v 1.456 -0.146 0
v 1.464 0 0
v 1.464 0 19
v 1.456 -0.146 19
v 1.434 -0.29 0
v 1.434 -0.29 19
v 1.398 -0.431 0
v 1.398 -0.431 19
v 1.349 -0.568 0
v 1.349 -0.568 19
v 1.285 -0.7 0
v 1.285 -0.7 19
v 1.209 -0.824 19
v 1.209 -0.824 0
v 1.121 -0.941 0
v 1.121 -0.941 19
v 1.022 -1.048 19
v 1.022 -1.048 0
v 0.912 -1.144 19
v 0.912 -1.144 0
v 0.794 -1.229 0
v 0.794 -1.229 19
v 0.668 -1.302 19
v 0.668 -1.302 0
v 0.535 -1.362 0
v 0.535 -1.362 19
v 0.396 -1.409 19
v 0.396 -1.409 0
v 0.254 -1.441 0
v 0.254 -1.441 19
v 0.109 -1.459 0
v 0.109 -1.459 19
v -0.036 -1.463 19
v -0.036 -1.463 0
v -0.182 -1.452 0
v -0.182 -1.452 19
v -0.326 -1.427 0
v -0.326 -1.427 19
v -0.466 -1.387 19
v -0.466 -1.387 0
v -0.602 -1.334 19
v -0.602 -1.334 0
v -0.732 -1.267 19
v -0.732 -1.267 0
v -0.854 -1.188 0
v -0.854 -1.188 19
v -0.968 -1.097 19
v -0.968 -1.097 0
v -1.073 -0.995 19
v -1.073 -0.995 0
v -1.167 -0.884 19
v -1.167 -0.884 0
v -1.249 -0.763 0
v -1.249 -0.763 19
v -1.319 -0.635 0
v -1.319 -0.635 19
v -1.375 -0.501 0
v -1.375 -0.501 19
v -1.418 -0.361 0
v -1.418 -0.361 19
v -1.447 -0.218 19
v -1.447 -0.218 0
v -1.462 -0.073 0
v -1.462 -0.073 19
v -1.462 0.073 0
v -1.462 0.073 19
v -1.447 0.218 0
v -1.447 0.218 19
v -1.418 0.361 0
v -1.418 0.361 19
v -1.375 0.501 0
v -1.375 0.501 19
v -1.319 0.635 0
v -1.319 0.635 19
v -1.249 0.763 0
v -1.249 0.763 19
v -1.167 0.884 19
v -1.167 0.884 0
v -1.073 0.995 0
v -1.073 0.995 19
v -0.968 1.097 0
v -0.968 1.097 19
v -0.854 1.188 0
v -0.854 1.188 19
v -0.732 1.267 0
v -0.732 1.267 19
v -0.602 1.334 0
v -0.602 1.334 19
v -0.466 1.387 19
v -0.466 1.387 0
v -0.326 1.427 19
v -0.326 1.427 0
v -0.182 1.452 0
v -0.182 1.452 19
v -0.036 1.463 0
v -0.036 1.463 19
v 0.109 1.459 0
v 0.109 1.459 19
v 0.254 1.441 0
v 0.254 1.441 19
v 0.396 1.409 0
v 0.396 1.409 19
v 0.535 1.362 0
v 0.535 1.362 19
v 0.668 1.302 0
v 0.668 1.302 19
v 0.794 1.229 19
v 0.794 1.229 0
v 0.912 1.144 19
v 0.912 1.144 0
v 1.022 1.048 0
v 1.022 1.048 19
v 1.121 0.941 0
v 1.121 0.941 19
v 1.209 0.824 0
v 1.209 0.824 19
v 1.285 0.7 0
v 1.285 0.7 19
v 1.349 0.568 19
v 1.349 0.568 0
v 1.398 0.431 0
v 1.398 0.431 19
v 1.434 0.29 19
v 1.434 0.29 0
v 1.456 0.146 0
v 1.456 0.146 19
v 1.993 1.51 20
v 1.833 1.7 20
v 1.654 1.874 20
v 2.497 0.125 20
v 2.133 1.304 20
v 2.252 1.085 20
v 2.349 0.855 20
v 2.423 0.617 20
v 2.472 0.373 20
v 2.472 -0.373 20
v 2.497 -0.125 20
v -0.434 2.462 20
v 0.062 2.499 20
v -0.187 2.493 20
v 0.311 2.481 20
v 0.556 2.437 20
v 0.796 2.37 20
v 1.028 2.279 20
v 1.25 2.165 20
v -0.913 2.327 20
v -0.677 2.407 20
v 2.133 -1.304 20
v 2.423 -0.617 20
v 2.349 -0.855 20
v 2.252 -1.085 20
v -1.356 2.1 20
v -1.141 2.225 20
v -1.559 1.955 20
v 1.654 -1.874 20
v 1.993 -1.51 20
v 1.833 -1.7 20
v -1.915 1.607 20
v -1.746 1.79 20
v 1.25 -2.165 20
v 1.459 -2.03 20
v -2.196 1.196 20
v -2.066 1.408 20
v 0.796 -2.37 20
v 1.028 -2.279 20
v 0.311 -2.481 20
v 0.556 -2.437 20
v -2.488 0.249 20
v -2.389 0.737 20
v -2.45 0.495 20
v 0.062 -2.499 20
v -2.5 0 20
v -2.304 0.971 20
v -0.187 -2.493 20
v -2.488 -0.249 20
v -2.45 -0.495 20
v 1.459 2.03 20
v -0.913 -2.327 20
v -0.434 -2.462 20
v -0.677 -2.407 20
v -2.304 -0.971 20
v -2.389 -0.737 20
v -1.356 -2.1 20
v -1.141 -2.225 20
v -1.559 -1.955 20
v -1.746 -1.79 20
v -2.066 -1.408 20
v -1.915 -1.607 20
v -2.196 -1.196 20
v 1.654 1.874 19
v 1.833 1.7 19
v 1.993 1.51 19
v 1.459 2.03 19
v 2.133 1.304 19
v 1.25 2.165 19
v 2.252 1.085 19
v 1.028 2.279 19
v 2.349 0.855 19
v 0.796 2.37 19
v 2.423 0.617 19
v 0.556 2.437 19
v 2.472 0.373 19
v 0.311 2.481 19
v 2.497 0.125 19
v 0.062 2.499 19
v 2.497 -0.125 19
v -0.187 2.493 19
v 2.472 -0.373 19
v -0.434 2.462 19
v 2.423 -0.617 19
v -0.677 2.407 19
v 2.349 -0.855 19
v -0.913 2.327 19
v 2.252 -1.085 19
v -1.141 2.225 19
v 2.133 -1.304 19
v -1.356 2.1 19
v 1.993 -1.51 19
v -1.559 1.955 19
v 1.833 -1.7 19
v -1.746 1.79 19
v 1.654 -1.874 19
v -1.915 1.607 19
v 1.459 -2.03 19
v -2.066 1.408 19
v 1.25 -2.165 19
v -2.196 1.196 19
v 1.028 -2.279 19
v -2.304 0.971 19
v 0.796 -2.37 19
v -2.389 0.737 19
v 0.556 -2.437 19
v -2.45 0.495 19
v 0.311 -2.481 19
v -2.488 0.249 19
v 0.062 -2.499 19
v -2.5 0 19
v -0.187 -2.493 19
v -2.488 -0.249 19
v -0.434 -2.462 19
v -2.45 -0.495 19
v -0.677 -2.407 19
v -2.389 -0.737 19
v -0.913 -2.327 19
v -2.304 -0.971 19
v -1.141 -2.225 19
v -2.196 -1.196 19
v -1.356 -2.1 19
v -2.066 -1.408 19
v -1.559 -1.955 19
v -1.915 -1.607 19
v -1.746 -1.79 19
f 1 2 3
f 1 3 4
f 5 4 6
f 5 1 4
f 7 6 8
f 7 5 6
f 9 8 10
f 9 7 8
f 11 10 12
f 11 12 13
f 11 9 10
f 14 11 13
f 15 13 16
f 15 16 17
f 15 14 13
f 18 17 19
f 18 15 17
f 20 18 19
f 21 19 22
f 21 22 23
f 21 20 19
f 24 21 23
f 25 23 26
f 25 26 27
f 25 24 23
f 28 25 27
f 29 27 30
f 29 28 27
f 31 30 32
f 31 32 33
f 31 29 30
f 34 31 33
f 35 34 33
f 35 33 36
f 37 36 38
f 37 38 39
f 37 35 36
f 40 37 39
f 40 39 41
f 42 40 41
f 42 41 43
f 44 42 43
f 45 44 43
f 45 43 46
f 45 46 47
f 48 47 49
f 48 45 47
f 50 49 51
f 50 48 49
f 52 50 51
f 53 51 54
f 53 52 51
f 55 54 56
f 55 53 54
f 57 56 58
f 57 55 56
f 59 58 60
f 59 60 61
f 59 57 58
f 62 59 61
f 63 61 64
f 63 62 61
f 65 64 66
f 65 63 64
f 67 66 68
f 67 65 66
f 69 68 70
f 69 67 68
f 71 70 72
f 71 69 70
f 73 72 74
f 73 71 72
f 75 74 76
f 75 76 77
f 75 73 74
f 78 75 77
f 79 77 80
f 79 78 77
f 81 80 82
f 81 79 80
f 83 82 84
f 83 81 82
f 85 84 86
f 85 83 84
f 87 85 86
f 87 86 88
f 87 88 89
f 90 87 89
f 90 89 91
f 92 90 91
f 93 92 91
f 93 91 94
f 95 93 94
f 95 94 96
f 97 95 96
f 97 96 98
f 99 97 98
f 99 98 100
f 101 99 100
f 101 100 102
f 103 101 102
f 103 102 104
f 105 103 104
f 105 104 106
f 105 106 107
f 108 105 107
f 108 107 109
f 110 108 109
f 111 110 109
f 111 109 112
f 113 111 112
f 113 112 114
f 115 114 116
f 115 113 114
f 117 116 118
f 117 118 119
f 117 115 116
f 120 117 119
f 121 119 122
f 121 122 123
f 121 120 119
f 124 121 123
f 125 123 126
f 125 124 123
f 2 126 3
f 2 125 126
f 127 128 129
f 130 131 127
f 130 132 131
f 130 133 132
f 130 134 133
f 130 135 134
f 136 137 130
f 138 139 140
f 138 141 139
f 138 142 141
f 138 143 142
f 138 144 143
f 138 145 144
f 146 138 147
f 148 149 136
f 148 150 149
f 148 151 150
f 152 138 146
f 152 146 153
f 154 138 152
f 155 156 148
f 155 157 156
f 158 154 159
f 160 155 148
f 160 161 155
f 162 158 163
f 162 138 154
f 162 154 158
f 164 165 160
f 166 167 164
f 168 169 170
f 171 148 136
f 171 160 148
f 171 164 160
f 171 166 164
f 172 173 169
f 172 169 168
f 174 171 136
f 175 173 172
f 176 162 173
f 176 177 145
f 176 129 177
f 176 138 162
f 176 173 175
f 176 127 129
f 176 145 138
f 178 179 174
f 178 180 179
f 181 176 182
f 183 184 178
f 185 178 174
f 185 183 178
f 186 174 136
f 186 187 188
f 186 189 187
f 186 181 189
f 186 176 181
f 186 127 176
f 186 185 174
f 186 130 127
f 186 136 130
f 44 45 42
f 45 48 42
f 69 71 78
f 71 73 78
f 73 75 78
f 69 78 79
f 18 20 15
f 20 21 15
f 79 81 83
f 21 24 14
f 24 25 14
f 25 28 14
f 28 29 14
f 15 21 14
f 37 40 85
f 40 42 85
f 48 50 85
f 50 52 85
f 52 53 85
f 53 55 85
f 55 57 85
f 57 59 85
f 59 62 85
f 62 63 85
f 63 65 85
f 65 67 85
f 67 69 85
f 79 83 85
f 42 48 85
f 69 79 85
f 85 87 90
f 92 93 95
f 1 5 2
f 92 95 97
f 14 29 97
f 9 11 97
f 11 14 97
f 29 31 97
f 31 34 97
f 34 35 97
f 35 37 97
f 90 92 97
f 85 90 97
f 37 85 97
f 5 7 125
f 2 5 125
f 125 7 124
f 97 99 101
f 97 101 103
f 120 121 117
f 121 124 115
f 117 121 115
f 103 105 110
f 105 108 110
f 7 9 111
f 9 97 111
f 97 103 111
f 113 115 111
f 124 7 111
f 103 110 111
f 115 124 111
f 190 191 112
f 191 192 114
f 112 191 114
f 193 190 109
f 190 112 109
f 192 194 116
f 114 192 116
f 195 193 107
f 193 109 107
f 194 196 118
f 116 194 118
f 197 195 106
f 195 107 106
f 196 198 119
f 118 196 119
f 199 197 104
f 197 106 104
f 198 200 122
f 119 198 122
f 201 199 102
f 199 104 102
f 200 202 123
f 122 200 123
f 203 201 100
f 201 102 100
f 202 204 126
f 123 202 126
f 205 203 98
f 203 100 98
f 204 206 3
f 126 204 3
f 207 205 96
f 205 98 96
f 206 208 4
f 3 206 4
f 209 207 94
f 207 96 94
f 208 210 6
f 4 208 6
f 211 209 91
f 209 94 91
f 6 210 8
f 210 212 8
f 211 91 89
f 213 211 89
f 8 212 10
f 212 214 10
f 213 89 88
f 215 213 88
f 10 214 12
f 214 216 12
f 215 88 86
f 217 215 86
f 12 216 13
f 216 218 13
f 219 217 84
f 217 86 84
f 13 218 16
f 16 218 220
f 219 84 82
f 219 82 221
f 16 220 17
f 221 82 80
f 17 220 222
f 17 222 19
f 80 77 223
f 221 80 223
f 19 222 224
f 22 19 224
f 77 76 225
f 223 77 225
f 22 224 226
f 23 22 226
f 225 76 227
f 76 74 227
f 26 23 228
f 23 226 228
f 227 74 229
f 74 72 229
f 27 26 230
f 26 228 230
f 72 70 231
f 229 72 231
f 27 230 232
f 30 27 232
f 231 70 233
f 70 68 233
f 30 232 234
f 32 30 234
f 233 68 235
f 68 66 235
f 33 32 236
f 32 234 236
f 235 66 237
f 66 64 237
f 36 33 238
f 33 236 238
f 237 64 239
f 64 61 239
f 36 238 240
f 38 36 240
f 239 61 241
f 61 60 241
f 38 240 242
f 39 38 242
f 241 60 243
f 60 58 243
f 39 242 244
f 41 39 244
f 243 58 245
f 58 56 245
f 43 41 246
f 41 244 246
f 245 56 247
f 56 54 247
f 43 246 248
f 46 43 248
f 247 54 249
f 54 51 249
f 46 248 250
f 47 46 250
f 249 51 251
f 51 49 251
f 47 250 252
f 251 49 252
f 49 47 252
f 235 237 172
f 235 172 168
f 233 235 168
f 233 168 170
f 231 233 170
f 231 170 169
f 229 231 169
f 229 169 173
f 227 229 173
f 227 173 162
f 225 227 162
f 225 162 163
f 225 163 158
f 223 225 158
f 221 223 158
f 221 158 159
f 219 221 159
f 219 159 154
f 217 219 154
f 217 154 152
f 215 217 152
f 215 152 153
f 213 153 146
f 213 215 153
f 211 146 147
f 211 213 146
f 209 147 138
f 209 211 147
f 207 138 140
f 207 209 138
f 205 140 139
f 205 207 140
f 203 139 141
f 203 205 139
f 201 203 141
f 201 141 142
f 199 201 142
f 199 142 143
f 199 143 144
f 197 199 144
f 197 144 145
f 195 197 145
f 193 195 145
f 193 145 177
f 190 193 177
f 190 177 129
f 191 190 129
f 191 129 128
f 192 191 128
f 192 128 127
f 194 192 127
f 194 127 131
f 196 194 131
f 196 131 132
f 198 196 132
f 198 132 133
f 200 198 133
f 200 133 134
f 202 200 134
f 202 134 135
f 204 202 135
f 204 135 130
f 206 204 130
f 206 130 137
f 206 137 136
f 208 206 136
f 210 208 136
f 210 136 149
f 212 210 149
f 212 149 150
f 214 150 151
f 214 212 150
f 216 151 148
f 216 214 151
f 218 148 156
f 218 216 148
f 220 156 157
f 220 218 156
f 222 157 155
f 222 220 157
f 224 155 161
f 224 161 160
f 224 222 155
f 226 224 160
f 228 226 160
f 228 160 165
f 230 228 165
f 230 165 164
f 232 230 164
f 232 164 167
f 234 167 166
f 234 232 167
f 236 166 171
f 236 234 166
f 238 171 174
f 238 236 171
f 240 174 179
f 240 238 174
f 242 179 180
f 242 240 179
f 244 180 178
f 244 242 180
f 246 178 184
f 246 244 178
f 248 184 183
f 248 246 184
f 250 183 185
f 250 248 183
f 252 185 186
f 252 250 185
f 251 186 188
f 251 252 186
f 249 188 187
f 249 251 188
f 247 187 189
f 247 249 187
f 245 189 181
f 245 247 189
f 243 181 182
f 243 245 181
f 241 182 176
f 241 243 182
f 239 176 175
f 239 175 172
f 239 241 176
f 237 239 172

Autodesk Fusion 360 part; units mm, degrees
sketch "Sketch1" plane through (0, 0, 0) normal (0, 0, 1) x (1, 0, 0)
  circle A0 centre (0, 0) radius 1.5
  dimension "d1" = 3
extrude "Extrude1" add sketch "Sketch1" along normal blind 19 makes body 1
sketch "Sketch2" plane through (0, 0, 19) normal (0, 0, 1) x (-1, 0, 0)
  circle A0 centre (0, 0) radius 1.5
  circle A1 centre (0, 0) radius 2.5
  dimension "d4" = 5
extrude "Extrude2" add sketch "Sketch2" along normal blind 1 separate body makes body 2
extrude "Extrude3" add 1 faces at (0.567, -0.5383, 19) along direction (0, 0, 1) blind 1 on bodies 1 bodies 1 2
thread "Thread1" "ISO Metric profile 3.0 M3x0.5 6g" major diameter 2.927 minor diameter 2.3555 pitch 0.5 angle 60 resizes the face on face at (1.4981, -0.0748, 6.3333) on bodies 1
